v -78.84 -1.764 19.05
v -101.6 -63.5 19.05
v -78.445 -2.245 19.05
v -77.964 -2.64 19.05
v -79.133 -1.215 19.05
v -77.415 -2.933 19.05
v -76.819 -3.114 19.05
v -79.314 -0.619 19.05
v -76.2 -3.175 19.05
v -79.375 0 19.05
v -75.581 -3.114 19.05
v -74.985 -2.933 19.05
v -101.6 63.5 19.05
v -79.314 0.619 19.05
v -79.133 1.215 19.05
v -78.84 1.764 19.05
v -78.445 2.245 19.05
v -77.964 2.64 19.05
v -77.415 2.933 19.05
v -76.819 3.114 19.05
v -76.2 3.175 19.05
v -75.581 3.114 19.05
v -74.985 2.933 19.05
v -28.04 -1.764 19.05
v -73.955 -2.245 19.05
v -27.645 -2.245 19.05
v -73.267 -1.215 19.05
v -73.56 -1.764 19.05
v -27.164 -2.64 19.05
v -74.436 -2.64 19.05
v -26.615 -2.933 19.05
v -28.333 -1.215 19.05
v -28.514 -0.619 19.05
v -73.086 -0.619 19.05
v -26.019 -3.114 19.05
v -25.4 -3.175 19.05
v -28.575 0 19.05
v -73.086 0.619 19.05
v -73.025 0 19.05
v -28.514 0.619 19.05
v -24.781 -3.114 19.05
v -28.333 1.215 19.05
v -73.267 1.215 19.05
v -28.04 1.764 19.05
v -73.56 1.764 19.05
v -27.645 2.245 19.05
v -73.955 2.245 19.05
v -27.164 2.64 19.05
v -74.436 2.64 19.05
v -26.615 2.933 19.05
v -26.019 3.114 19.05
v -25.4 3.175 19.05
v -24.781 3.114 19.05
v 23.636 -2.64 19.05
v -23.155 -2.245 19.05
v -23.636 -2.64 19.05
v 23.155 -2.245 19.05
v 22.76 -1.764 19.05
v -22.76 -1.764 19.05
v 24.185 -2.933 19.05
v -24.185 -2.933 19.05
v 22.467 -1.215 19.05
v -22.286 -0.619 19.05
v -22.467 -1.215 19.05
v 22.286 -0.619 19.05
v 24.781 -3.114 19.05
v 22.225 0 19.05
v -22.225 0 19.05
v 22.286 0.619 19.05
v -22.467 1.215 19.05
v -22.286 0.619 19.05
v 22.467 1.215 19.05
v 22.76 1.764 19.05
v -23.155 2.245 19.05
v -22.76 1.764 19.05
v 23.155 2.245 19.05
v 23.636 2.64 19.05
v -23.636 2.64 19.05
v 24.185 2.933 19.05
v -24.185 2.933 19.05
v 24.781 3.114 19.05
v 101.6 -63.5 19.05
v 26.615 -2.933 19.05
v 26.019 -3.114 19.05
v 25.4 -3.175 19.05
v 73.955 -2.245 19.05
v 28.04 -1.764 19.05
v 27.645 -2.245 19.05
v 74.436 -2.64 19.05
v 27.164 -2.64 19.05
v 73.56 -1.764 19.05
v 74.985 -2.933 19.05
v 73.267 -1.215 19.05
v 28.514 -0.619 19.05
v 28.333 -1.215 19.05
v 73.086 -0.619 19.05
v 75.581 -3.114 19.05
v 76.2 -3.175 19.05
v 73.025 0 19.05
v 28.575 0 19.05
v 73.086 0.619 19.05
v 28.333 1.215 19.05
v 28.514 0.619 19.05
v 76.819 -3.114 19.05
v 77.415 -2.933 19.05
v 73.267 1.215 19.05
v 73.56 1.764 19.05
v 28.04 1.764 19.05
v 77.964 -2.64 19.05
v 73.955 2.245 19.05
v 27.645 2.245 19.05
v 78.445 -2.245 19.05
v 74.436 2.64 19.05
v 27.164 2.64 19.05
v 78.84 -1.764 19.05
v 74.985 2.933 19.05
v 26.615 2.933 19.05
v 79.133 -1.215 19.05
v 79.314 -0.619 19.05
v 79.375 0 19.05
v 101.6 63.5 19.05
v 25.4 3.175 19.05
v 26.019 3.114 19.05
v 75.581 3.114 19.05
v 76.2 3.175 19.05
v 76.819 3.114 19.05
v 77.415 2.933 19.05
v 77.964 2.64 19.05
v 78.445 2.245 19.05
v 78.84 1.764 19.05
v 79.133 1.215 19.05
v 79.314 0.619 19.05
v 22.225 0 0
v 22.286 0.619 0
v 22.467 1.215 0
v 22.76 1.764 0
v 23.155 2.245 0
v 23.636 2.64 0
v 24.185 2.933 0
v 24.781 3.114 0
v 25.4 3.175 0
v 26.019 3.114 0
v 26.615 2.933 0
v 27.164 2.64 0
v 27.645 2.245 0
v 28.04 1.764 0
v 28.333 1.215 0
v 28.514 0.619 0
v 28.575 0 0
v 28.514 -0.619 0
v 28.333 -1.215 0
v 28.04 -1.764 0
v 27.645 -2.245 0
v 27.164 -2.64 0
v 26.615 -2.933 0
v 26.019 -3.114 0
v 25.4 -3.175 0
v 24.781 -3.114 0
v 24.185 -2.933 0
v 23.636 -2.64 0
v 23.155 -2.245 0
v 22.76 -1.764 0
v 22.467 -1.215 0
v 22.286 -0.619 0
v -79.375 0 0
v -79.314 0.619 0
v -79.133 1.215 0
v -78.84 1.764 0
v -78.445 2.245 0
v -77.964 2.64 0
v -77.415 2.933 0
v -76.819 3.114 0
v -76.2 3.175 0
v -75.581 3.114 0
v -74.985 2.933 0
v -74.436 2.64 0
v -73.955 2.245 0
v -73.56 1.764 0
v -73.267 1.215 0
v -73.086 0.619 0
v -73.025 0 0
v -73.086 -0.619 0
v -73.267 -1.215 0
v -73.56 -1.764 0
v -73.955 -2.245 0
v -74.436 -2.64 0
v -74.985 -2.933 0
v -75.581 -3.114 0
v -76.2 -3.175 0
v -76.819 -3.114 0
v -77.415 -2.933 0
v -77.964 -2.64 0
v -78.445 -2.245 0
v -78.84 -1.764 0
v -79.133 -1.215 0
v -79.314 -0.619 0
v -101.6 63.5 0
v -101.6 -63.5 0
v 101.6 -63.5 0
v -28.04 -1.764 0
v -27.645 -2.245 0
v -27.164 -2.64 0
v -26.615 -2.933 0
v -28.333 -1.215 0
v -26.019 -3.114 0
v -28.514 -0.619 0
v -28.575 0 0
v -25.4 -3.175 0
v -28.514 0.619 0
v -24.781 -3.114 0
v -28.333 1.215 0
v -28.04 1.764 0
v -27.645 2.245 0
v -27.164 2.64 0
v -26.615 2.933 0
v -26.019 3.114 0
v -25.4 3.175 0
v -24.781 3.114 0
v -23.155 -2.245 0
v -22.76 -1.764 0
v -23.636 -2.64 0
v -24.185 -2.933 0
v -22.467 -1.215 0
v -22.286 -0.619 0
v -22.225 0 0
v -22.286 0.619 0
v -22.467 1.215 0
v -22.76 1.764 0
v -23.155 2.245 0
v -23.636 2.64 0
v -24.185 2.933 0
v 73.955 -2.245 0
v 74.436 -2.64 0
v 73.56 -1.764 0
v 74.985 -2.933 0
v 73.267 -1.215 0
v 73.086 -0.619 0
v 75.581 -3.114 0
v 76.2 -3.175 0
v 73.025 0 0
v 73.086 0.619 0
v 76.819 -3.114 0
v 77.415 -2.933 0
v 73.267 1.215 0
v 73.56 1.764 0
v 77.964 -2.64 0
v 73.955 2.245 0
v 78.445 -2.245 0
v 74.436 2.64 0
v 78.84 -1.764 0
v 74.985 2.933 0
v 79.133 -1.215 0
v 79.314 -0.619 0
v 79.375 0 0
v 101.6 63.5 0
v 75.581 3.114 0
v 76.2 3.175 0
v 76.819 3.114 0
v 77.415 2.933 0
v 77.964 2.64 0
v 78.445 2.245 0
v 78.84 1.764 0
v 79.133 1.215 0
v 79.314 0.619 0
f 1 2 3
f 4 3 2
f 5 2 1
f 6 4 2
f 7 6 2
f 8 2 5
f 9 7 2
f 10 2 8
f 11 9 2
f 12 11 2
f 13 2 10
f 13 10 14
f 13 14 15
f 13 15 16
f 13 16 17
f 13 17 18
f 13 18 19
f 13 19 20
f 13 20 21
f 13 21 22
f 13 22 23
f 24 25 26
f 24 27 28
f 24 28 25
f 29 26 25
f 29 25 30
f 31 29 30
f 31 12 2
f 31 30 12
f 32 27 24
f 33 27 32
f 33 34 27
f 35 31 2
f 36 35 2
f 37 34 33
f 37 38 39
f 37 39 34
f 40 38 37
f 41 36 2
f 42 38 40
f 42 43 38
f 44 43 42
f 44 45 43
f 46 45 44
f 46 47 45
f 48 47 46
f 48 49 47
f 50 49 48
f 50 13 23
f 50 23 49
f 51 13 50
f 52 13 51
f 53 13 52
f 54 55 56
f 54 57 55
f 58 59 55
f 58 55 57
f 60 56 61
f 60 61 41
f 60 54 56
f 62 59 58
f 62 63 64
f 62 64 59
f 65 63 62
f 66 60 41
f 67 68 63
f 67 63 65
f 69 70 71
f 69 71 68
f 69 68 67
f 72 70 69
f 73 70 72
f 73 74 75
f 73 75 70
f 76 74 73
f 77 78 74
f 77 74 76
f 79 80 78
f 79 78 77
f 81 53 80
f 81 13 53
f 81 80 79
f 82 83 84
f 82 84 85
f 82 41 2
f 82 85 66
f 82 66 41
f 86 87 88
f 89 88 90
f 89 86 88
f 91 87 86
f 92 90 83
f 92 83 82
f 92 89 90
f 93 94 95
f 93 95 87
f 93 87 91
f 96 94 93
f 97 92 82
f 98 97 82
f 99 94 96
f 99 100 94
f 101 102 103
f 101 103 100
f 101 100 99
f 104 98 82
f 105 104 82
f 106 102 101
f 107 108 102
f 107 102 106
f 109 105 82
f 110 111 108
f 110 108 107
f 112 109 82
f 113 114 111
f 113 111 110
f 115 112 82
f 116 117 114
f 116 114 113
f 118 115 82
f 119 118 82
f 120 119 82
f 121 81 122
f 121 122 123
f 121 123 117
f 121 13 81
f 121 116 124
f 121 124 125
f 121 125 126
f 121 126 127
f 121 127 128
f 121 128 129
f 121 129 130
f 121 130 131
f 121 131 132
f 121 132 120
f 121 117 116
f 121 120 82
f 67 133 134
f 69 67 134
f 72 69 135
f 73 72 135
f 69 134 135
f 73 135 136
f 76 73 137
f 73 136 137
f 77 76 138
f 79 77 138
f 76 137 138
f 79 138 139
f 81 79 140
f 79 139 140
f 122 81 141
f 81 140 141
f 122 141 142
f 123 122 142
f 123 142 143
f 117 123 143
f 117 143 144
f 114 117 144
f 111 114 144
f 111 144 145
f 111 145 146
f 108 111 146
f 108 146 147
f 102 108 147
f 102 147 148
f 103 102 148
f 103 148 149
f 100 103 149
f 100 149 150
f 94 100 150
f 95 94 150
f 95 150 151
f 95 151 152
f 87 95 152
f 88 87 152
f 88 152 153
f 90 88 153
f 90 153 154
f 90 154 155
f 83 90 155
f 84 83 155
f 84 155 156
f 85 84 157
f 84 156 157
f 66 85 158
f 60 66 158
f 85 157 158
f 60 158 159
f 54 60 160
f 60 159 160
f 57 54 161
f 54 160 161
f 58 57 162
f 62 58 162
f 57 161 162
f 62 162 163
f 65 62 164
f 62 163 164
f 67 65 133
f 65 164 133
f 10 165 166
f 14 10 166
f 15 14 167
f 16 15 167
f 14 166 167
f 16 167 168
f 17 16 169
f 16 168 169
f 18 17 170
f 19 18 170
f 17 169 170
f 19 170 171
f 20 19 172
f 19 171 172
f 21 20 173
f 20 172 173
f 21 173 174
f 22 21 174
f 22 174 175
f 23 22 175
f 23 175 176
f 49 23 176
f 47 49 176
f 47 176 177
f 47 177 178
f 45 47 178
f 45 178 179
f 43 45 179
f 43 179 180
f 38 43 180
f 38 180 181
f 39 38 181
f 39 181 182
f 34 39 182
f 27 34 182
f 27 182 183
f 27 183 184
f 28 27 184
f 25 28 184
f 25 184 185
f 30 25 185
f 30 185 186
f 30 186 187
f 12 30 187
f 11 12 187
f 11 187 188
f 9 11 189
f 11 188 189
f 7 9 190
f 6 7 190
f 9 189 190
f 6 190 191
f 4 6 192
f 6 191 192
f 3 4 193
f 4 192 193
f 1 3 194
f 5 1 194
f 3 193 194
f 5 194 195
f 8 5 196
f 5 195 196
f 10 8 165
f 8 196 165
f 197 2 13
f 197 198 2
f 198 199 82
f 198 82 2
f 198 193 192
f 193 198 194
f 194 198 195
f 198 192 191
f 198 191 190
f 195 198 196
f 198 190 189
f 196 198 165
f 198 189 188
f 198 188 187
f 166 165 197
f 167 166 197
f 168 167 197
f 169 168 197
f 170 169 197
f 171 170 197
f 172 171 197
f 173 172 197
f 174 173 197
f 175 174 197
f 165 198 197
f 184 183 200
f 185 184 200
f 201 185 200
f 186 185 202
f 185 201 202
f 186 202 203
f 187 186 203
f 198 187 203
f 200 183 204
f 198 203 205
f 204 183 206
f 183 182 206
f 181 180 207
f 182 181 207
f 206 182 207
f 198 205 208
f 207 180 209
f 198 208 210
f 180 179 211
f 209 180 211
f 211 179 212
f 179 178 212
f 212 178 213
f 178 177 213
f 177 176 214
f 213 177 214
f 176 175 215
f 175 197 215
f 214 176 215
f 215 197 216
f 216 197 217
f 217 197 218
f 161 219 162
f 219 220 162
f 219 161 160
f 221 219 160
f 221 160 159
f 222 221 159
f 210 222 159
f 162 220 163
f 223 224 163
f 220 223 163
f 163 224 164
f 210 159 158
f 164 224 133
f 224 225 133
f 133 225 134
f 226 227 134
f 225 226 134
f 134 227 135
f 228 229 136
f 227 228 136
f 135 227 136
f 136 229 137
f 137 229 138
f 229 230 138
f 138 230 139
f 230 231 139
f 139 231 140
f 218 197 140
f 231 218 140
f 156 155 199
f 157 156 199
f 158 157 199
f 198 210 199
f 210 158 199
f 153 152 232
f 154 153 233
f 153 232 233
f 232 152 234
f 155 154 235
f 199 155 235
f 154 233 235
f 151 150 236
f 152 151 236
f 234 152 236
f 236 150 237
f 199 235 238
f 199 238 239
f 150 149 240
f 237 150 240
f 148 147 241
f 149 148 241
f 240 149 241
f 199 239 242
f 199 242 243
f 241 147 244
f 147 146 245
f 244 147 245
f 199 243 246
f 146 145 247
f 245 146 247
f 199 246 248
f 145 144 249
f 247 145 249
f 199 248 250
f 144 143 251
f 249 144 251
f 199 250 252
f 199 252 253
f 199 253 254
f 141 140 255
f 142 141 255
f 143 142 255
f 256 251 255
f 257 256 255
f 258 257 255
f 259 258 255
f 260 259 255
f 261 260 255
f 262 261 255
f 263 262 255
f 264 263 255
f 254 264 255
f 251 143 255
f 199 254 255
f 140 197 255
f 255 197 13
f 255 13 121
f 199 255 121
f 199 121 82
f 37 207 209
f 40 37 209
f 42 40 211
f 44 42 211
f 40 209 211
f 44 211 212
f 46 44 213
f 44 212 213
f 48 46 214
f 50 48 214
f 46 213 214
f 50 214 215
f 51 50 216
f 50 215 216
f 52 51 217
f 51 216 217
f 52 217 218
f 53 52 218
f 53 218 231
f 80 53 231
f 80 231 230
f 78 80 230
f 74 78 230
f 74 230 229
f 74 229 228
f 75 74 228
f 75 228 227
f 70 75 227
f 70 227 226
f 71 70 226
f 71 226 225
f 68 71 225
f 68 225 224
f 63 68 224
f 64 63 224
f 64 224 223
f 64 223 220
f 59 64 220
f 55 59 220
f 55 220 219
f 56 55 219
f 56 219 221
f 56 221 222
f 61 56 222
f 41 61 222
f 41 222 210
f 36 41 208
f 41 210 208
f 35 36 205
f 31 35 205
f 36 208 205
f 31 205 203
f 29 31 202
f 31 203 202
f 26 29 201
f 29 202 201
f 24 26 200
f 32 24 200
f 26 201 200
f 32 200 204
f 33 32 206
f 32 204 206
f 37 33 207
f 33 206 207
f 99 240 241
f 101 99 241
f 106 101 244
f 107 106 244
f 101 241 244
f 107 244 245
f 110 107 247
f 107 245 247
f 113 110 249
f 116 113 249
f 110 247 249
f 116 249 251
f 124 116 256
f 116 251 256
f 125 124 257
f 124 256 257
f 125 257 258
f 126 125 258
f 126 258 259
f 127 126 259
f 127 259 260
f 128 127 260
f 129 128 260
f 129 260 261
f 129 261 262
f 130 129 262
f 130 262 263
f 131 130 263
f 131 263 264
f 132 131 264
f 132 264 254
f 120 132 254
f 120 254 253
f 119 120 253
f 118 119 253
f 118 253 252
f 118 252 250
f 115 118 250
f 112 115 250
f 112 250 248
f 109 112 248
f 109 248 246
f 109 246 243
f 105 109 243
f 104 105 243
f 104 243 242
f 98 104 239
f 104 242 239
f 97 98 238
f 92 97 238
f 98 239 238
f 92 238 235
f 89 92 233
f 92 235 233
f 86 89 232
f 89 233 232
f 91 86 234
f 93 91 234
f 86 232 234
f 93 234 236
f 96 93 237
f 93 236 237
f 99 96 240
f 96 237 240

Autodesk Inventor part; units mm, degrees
ref_plane "YZ Plane" through (0, 0, 0) normal (1, 0, 0) x (0, 1, 0)
ref_plane "XZ Plane" through (0, 0, 0) normal (0, 1, 0) x (-1, 0, 0)
ref_plane "XY Plane" through (0, 0, 0) normal (0, 0, 1) x (1, 0, 0)
sketch "Sketch1" plane through (0, 0, 0) normal (0, 0, 1) x (1, 0, 0)
  line L0 (-101.6, 63.5) -> (101.6, 63.5)
  line L1 (101.6, 63.5) -> (101.6, -63.5)
  line L2 (101.6, -63.5) -> (-101.6, -63.5)
  line L3 (-101.6, -63.5) -> (-101.6, 63.5)
  line L4 (-101.6, 63.5) -> (101.6, -63.5) construction
  line L5 (101.6, 63.5) -> (-101.6, -63.5) construction
  circle A0 centre (-76.2, 0) radius 3.175
  circle A1 centre (-25.4, 0) radius 3.175
  circle A2 centre (25.4, 0) radius 3.175
  circle A3 centre (76.2, 0) radius 3.175
  point P0 (0, 0)
  dimension "d0" = 203.2
  dimension "d1" = 127
  dimension "d2" = 6.35
  dimension "d3" = 6.35
  dimension "d4" = 6.35
  dimension "d5" = 6.35
  dimension "d6" = 25.4
  dimension "d7" = 76.2
  dimension "d8" = 127
  dimension "d9" = 177.8
extrude "Extrusion1" add sketch "Sketch1" along normal blind 19.05 contours L0 L1 L2 L3 | A0 | A1 | A2 | A3
sketch "Sketch2" plane through (0, 0, 0) normal (0, 0, -1) x (-1, 0, 0)
  circle A0 centre (-76.2, 0) radius 3.175
  circle A1 centre (-25.4, 0) radius 3.175
  circle A2 centre (25.4, 0) radius 3.175
  circle A3 centre (76.2, 0) radius 3.175
  line L0 (-101.6, 63.5) -> (101.6, 63.5) projected
  line L1 (-101.6, -63.5) -> (-101.6, 63.5) projected
  point P0 (0, 0)
  dimension "d12" = 6.35
  dimension "d13" = 6.35
  dimension "d14" = 6.35
  dimension "d15" = 6.35
  dimension "d17" = 63.5
  dimension "d18" = 63.5
  dimension "d19" = 25.4
  dimension "d20" = 76.2
  dimension "d21" = 127
  dimension "d22" = 177.8
extrude "Extrusion2" cut sketch "Sketch2" against normal blind 19.05
properties part number "Part_Back"
